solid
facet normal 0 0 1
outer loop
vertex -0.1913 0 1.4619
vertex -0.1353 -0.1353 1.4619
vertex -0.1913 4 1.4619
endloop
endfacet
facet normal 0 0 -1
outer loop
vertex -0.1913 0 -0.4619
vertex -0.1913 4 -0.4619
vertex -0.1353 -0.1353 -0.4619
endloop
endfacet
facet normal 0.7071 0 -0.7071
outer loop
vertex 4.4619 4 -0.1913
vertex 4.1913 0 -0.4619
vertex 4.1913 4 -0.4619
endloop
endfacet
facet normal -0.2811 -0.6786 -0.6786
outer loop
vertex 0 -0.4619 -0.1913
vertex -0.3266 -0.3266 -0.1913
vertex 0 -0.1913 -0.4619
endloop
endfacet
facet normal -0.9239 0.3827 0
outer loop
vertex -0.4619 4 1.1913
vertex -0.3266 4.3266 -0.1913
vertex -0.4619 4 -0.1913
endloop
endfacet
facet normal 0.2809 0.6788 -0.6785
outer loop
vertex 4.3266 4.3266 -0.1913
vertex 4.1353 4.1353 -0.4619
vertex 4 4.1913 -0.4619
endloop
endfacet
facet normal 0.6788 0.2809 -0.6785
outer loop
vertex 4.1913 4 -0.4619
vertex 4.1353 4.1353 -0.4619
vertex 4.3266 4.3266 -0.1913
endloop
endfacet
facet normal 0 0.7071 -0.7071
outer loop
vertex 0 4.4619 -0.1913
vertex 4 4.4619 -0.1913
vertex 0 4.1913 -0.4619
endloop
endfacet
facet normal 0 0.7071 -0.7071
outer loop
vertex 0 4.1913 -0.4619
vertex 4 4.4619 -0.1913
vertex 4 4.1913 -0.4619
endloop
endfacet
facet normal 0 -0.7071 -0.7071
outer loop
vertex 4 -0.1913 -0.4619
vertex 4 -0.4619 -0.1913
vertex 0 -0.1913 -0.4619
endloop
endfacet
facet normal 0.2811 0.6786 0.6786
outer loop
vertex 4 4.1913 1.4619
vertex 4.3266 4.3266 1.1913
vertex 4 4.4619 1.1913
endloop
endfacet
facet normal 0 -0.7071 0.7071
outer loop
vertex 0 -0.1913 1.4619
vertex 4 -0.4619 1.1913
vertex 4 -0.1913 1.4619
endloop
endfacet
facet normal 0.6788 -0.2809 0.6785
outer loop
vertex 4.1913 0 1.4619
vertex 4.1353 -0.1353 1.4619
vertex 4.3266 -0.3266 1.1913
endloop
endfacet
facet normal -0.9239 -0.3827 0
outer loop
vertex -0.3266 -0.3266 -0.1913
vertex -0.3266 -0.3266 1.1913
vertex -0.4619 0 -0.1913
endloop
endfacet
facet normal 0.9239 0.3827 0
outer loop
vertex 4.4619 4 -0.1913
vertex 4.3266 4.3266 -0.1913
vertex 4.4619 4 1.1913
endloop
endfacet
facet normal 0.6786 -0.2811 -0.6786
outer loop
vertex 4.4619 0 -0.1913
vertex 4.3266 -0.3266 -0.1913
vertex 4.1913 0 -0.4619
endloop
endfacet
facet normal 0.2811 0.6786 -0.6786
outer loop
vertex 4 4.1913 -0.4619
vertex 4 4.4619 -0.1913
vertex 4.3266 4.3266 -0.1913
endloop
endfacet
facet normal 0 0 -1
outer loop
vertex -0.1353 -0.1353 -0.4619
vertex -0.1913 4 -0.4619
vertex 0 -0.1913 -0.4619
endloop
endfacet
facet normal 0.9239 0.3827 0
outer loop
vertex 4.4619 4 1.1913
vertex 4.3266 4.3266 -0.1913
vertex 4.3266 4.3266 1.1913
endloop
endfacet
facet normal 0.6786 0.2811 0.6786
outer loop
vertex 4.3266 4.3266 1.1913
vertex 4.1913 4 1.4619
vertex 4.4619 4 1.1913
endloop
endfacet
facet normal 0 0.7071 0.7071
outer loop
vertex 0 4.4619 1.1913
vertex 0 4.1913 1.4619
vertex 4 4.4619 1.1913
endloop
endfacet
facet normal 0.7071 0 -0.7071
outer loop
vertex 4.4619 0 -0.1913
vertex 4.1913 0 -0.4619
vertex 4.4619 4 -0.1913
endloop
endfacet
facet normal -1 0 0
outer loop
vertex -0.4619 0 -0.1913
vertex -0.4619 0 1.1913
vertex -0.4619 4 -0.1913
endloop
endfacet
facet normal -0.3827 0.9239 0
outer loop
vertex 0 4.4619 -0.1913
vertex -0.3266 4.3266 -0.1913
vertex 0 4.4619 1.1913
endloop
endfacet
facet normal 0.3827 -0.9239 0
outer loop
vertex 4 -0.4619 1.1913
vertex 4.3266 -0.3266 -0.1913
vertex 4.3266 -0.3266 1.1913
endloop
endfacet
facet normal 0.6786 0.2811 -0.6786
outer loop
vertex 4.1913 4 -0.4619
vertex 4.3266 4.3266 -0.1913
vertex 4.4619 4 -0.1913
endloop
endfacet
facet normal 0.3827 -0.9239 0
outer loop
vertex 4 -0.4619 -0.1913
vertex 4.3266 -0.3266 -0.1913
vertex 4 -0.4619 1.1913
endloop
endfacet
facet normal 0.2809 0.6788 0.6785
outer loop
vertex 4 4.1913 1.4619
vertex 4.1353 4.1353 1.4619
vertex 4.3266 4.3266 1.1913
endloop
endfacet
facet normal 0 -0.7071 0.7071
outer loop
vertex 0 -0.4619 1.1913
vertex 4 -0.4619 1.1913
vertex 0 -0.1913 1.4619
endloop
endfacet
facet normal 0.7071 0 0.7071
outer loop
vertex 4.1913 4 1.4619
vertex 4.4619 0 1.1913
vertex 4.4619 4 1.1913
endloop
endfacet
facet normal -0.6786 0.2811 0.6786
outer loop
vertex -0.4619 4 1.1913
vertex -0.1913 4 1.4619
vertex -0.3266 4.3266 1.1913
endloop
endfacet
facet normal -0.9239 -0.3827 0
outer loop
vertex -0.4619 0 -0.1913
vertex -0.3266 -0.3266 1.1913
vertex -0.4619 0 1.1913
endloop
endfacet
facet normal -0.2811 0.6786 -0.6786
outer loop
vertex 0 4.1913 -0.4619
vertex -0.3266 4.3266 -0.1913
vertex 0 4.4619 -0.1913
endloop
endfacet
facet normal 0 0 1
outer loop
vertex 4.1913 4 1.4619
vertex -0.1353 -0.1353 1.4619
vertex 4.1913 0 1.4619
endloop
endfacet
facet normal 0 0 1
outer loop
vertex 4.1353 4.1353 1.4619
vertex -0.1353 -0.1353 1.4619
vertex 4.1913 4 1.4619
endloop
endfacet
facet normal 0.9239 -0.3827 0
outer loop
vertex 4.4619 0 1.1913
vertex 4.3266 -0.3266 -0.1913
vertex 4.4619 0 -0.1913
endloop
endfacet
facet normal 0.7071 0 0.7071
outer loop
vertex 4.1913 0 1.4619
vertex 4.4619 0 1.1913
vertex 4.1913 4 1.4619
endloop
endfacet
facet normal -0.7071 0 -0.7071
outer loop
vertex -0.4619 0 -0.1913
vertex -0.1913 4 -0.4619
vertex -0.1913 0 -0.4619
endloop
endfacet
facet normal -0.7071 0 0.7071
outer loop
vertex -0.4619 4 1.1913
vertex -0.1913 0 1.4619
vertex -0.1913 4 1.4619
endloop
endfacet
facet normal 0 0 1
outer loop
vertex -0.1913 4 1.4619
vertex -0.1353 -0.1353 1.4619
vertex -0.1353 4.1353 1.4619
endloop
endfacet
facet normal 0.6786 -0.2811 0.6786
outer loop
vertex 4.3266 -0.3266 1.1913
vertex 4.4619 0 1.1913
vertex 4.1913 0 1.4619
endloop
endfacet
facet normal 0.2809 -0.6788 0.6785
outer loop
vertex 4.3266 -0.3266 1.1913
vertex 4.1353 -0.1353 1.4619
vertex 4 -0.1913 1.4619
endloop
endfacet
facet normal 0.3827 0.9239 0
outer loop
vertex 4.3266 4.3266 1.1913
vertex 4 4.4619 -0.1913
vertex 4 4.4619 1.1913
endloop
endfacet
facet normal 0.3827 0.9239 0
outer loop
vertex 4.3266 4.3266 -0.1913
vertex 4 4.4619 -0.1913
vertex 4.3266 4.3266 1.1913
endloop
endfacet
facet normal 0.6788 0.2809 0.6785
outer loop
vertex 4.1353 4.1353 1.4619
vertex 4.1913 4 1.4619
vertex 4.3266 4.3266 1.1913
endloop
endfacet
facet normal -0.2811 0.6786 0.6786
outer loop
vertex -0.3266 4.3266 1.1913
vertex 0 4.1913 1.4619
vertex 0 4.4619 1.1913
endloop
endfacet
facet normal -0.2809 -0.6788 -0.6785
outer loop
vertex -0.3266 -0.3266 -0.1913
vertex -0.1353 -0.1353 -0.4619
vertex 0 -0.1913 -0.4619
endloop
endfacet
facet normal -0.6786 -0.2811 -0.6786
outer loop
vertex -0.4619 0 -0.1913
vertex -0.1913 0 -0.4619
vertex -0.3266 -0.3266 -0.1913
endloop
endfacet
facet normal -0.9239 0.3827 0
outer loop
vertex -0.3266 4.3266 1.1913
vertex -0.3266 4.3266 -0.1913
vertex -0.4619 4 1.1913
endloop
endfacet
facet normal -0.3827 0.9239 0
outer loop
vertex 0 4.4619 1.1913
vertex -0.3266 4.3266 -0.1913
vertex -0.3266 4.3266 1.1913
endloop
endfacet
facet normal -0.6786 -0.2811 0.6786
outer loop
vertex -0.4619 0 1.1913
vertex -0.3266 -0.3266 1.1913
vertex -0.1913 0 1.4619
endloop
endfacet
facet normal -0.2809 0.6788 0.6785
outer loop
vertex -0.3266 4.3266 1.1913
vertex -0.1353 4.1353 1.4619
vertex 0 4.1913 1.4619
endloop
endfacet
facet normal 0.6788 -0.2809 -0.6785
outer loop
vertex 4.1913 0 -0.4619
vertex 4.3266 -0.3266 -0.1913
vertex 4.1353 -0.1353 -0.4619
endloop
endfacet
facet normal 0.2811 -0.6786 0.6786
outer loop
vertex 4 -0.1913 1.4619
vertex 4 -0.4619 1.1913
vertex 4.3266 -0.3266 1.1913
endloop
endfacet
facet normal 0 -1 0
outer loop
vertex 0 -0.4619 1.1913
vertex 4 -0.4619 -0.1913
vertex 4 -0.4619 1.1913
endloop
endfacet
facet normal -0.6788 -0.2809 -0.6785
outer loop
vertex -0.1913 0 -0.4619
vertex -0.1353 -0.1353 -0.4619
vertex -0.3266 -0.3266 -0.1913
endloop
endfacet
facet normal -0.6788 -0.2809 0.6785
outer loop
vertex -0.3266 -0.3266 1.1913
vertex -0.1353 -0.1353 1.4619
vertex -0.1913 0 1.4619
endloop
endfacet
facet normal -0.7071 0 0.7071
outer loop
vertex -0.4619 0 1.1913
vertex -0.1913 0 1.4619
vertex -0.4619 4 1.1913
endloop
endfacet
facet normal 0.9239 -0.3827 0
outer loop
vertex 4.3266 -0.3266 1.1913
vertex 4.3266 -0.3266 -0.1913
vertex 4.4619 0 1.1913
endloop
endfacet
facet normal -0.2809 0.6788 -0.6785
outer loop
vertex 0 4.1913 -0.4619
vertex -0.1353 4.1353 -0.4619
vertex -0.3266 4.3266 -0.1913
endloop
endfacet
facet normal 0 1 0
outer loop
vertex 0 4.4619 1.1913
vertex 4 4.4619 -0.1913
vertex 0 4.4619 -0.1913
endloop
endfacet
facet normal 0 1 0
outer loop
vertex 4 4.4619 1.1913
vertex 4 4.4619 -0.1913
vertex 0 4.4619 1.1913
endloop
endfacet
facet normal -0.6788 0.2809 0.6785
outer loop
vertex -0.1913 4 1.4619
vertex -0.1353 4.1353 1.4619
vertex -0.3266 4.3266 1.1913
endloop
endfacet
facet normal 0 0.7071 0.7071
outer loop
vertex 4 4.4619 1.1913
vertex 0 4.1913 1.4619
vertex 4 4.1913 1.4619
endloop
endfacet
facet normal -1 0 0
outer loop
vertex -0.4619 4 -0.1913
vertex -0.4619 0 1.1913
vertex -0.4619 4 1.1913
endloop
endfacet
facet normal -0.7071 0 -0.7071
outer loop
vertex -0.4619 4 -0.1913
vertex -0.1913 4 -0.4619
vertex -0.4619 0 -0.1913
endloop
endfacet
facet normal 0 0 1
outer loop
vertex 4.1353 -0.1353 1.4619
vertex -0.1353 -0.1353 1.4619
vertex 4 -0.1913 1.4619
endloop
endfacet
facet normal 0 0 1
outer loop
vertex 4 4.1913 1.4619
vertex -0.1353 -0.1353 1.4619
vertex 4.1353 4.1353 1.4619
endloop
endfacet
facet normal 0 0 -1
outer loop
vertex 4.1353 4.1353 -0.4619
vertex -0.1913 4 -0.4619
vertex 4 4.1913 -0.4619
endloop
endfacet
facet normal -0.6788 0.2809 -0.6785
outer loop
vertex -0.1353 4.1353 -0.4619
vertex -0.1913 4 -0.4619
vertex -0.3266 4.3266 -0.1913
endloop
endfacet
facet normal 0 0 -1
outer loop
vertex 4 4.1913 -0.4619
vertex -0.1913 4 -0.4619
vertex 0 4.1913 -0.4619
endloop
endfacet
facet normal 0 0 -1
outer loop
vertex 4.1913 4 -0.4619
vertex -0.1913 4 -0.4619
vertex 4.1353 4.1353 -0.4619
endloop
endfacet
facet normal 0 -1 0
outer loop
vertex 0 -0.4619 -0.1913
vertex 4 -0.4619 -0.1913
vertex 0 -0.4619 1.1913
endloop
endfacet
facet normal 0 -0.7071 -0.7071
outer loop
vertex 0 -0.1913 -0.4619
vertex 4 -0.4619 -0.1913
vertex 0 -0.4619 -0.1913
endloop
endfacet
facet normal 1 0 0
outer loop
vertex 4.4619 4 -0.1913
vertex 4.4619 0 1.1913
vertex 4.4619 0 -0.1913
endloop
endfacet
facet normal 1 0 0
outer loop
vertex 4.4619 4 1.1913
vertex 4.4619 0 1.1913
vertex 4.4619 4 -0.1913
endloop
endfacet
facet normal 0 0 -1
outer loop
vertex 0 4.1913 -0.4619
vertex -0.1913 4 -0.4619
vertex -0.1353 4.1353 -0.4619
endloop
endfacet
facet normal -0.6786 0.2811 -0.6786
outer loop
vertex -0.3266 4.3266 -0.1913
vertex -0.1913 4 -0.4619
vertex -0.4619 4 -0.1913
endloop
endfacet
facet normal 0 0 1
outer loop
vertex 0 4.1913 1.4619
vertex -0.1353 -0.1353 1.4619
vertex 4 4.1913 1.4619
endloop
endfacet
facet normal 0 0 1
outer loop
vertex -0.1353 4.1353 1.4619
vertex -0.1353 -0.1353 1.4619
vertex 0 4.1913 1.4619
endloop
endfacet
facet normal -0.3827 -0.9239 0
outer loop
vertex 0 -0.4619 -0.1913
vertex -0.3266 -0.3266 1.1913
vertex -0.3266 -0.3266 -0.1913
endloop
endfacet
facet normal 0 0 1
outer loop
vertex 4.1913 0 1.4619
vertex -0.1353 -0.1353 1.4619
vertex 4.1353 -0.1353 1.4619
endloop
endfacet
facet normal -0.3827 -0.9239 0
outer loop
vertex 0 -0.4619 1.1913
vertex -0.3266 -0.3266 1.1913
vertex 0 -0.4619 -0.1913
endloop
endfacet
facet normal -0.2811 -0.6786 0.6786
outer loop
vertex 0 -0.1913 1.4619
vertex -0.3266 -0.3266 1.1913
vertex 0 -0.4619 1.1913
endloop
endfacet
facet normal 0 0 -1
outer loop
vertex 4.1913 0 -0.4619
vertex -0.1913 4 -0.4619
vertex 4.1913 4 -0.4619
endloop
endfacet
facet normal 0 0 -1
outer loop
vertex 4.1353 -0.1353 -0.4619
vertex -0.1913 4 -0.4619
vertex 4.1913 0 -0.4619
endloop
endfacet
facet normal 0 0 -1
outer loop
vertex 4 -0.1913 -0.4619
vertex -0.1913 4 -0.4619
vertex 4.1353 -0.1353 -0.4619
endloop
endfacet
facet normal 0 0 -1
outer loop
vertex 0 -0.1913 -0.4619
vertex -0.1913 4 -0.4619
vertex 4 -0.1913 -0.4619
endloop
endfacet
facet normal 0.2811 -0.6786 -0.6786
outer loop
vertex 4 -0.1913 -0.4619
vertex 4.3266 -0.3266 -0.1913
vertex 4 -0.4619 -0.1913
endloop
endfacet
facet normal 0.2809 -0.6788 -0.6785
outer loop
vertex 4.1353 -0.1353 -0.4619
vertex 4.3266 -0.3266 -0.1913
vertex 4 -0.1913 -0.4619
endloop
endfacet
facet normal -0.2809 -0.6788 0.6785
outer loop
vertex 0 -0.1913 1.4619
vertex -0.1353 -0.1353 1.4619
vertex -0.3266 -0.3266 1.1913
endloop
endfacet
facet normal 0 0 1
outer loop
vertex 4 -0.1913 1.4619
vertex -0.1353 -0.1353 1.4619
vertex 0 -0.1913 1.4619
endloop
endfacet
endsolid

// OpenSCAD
// minkowski of convex solids (rounded box)
minkowski() {
  cube([4, 4, 1]);
  sphere(0.5, $fn = 8);
}
